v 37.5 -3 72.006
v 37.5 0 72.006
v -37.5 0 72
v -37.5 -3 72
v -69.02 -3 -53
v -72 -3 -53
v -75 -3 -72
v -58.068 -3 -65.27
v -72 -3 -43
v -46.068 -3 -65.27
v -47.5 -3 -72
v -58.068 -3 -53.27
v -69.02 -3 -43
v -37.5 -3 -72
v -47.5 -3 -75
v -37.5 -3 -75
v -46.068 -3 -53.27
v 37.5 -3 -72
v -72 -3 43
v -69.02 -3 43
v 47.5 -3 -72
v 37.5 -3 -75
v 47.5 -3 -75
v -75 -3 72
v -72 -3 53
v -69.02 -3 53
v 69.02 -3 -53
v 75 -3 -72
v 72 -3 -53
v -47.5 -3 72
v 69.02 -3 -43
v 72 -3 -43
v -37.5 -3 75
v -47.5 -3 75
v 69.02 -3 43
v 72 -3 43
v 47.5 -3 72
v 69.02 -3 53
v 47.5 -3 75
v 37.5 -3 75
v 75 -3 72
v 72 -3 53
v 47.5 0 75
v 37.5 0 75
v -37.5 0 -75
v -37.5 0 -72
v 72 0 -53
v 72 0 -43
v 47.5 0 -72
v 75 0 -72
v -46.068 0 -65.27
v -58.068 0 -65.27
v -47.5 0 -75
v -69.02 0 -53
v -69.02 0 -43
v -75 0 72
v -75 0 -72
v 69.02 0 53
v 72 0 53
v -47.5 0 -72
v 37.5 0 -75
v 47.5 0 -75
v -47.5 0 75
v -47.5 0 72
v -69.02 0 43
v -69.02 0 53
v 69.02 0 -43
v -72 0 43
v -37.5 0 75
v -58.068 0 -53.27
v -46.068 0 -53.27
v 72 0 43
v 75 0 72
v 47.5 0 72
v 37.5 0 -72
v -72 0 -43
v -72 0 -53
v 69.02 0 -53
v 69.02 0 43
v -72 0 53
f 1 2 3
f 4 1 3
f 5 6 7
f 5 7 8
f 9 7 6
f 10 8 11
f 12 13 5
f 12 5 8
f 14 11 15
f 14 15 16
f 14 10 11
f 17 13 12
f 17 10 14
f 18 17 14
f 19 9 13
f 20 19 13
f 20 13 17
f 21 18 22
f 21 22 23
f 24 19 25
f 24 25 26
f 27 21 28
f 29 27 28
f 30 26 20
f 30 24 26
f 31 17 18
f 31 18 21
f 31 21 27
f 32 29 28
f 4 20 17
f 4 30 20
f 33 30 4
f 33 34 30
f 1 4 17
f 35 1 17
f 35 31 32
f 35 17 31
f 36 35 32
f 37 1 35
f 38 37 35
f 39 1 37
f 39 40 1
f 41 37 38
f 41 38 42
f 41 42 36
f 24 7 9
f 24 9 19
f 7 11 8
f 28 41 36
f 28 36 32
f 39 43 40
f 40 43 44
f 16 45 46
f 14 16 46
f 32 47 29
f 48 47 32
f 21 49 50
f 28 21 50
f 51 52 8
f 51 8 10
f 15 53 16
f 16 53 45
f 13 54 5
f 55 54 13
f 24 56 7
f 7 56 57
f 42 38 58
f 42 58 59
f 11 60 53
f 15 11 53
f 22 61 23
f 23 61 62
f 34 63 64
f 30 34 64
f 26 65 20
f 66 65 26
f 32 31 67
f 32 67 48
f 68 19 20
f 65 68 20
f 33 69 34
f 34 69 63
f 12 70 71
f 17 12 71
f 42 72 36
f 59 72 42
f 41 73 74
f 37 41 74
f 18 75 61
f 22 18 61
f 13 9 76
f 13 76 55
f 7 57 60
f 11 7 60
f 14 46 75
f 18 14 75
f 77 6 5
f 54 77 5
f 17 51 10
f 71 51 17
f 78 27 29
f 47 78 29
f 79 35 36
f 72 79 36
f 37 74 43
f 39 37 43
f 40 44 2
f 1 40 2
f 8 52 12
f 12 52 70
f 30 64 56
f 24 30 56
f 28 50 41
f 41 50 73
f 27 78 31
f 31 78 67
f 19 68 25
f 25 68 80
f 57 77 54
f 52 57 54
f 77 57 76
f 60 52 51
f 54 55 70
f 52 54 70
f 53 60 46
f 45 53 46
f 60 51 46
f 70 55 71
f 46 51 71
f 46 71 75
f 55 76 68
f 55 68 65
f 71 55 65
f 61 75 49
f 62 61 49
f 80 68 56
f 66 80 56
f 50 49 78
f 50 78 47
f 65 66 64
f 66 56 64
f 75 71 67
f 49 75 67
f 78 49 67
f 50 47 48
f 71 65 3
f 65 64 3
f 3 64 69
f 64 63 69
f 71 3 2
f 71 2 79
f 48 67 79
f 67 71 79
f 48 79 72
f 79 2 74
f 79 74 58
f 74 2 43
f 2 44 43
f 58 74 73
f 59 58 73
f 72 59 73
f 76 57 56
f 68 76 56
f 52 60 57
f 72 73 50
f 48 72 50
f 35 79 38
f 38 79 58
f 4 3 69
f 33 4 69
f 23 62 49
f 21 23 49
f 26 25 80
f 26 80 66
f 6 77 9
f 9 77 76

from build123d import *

# Parameters (mm, degrees)
F0_W     = 12
F0_H     = 12
F0_W_2   = 2.98
F0_H_2   = 10
F1_DEPTH = 3


with BuildPart() as f1:
    # F0 (on Front) → F1 (new body)
    with BuildSketch(Plane.XZ):
        Polygon((-47.500234, 72), (-75.000234, 72), (-74.999766, -72), (-47.499766, -72), (-47.499766, -75), (-37.499766, -75), (-37.499766, -72), (37.500234, -72), (37.500234, -75), (47.500234, -75), (47.500234, -72), (75.000234, -72), (74.999766, 72), (47.5, 72), (47.5, 75), (37.5, 75), (37.5, 72.005854), (-37.5, 72), (-37.500234, 75), (-47.500234, 75), align=None)
        with Locations((-52.06838, -59.269677)):
            Rectangle(F0_W, F0_H, mode=Mode.SUBTRACT)
        with Locations((-70.510156, -48)):
            Rectangle(F0_W_2, F0_H_2, mode=Mode.SUBTRACT)
        with Locations((70.510156, -48)):
            Rectangle(F0_W_2, F0_H_2, mode=Mode.SUBTRACT)
        with Locations((-70.510156, 48)):
            Rectangle(F0_W_2, F0_H_2, mode=Mode.SUBTRACT)
        with Locations((70.510156, 48)):
            Rectangle(F0_W_2, F0_H_2, mode=Mode.SUBTRACT)
    extrude(amount=F1_DEPTH)


solid = f1.part
